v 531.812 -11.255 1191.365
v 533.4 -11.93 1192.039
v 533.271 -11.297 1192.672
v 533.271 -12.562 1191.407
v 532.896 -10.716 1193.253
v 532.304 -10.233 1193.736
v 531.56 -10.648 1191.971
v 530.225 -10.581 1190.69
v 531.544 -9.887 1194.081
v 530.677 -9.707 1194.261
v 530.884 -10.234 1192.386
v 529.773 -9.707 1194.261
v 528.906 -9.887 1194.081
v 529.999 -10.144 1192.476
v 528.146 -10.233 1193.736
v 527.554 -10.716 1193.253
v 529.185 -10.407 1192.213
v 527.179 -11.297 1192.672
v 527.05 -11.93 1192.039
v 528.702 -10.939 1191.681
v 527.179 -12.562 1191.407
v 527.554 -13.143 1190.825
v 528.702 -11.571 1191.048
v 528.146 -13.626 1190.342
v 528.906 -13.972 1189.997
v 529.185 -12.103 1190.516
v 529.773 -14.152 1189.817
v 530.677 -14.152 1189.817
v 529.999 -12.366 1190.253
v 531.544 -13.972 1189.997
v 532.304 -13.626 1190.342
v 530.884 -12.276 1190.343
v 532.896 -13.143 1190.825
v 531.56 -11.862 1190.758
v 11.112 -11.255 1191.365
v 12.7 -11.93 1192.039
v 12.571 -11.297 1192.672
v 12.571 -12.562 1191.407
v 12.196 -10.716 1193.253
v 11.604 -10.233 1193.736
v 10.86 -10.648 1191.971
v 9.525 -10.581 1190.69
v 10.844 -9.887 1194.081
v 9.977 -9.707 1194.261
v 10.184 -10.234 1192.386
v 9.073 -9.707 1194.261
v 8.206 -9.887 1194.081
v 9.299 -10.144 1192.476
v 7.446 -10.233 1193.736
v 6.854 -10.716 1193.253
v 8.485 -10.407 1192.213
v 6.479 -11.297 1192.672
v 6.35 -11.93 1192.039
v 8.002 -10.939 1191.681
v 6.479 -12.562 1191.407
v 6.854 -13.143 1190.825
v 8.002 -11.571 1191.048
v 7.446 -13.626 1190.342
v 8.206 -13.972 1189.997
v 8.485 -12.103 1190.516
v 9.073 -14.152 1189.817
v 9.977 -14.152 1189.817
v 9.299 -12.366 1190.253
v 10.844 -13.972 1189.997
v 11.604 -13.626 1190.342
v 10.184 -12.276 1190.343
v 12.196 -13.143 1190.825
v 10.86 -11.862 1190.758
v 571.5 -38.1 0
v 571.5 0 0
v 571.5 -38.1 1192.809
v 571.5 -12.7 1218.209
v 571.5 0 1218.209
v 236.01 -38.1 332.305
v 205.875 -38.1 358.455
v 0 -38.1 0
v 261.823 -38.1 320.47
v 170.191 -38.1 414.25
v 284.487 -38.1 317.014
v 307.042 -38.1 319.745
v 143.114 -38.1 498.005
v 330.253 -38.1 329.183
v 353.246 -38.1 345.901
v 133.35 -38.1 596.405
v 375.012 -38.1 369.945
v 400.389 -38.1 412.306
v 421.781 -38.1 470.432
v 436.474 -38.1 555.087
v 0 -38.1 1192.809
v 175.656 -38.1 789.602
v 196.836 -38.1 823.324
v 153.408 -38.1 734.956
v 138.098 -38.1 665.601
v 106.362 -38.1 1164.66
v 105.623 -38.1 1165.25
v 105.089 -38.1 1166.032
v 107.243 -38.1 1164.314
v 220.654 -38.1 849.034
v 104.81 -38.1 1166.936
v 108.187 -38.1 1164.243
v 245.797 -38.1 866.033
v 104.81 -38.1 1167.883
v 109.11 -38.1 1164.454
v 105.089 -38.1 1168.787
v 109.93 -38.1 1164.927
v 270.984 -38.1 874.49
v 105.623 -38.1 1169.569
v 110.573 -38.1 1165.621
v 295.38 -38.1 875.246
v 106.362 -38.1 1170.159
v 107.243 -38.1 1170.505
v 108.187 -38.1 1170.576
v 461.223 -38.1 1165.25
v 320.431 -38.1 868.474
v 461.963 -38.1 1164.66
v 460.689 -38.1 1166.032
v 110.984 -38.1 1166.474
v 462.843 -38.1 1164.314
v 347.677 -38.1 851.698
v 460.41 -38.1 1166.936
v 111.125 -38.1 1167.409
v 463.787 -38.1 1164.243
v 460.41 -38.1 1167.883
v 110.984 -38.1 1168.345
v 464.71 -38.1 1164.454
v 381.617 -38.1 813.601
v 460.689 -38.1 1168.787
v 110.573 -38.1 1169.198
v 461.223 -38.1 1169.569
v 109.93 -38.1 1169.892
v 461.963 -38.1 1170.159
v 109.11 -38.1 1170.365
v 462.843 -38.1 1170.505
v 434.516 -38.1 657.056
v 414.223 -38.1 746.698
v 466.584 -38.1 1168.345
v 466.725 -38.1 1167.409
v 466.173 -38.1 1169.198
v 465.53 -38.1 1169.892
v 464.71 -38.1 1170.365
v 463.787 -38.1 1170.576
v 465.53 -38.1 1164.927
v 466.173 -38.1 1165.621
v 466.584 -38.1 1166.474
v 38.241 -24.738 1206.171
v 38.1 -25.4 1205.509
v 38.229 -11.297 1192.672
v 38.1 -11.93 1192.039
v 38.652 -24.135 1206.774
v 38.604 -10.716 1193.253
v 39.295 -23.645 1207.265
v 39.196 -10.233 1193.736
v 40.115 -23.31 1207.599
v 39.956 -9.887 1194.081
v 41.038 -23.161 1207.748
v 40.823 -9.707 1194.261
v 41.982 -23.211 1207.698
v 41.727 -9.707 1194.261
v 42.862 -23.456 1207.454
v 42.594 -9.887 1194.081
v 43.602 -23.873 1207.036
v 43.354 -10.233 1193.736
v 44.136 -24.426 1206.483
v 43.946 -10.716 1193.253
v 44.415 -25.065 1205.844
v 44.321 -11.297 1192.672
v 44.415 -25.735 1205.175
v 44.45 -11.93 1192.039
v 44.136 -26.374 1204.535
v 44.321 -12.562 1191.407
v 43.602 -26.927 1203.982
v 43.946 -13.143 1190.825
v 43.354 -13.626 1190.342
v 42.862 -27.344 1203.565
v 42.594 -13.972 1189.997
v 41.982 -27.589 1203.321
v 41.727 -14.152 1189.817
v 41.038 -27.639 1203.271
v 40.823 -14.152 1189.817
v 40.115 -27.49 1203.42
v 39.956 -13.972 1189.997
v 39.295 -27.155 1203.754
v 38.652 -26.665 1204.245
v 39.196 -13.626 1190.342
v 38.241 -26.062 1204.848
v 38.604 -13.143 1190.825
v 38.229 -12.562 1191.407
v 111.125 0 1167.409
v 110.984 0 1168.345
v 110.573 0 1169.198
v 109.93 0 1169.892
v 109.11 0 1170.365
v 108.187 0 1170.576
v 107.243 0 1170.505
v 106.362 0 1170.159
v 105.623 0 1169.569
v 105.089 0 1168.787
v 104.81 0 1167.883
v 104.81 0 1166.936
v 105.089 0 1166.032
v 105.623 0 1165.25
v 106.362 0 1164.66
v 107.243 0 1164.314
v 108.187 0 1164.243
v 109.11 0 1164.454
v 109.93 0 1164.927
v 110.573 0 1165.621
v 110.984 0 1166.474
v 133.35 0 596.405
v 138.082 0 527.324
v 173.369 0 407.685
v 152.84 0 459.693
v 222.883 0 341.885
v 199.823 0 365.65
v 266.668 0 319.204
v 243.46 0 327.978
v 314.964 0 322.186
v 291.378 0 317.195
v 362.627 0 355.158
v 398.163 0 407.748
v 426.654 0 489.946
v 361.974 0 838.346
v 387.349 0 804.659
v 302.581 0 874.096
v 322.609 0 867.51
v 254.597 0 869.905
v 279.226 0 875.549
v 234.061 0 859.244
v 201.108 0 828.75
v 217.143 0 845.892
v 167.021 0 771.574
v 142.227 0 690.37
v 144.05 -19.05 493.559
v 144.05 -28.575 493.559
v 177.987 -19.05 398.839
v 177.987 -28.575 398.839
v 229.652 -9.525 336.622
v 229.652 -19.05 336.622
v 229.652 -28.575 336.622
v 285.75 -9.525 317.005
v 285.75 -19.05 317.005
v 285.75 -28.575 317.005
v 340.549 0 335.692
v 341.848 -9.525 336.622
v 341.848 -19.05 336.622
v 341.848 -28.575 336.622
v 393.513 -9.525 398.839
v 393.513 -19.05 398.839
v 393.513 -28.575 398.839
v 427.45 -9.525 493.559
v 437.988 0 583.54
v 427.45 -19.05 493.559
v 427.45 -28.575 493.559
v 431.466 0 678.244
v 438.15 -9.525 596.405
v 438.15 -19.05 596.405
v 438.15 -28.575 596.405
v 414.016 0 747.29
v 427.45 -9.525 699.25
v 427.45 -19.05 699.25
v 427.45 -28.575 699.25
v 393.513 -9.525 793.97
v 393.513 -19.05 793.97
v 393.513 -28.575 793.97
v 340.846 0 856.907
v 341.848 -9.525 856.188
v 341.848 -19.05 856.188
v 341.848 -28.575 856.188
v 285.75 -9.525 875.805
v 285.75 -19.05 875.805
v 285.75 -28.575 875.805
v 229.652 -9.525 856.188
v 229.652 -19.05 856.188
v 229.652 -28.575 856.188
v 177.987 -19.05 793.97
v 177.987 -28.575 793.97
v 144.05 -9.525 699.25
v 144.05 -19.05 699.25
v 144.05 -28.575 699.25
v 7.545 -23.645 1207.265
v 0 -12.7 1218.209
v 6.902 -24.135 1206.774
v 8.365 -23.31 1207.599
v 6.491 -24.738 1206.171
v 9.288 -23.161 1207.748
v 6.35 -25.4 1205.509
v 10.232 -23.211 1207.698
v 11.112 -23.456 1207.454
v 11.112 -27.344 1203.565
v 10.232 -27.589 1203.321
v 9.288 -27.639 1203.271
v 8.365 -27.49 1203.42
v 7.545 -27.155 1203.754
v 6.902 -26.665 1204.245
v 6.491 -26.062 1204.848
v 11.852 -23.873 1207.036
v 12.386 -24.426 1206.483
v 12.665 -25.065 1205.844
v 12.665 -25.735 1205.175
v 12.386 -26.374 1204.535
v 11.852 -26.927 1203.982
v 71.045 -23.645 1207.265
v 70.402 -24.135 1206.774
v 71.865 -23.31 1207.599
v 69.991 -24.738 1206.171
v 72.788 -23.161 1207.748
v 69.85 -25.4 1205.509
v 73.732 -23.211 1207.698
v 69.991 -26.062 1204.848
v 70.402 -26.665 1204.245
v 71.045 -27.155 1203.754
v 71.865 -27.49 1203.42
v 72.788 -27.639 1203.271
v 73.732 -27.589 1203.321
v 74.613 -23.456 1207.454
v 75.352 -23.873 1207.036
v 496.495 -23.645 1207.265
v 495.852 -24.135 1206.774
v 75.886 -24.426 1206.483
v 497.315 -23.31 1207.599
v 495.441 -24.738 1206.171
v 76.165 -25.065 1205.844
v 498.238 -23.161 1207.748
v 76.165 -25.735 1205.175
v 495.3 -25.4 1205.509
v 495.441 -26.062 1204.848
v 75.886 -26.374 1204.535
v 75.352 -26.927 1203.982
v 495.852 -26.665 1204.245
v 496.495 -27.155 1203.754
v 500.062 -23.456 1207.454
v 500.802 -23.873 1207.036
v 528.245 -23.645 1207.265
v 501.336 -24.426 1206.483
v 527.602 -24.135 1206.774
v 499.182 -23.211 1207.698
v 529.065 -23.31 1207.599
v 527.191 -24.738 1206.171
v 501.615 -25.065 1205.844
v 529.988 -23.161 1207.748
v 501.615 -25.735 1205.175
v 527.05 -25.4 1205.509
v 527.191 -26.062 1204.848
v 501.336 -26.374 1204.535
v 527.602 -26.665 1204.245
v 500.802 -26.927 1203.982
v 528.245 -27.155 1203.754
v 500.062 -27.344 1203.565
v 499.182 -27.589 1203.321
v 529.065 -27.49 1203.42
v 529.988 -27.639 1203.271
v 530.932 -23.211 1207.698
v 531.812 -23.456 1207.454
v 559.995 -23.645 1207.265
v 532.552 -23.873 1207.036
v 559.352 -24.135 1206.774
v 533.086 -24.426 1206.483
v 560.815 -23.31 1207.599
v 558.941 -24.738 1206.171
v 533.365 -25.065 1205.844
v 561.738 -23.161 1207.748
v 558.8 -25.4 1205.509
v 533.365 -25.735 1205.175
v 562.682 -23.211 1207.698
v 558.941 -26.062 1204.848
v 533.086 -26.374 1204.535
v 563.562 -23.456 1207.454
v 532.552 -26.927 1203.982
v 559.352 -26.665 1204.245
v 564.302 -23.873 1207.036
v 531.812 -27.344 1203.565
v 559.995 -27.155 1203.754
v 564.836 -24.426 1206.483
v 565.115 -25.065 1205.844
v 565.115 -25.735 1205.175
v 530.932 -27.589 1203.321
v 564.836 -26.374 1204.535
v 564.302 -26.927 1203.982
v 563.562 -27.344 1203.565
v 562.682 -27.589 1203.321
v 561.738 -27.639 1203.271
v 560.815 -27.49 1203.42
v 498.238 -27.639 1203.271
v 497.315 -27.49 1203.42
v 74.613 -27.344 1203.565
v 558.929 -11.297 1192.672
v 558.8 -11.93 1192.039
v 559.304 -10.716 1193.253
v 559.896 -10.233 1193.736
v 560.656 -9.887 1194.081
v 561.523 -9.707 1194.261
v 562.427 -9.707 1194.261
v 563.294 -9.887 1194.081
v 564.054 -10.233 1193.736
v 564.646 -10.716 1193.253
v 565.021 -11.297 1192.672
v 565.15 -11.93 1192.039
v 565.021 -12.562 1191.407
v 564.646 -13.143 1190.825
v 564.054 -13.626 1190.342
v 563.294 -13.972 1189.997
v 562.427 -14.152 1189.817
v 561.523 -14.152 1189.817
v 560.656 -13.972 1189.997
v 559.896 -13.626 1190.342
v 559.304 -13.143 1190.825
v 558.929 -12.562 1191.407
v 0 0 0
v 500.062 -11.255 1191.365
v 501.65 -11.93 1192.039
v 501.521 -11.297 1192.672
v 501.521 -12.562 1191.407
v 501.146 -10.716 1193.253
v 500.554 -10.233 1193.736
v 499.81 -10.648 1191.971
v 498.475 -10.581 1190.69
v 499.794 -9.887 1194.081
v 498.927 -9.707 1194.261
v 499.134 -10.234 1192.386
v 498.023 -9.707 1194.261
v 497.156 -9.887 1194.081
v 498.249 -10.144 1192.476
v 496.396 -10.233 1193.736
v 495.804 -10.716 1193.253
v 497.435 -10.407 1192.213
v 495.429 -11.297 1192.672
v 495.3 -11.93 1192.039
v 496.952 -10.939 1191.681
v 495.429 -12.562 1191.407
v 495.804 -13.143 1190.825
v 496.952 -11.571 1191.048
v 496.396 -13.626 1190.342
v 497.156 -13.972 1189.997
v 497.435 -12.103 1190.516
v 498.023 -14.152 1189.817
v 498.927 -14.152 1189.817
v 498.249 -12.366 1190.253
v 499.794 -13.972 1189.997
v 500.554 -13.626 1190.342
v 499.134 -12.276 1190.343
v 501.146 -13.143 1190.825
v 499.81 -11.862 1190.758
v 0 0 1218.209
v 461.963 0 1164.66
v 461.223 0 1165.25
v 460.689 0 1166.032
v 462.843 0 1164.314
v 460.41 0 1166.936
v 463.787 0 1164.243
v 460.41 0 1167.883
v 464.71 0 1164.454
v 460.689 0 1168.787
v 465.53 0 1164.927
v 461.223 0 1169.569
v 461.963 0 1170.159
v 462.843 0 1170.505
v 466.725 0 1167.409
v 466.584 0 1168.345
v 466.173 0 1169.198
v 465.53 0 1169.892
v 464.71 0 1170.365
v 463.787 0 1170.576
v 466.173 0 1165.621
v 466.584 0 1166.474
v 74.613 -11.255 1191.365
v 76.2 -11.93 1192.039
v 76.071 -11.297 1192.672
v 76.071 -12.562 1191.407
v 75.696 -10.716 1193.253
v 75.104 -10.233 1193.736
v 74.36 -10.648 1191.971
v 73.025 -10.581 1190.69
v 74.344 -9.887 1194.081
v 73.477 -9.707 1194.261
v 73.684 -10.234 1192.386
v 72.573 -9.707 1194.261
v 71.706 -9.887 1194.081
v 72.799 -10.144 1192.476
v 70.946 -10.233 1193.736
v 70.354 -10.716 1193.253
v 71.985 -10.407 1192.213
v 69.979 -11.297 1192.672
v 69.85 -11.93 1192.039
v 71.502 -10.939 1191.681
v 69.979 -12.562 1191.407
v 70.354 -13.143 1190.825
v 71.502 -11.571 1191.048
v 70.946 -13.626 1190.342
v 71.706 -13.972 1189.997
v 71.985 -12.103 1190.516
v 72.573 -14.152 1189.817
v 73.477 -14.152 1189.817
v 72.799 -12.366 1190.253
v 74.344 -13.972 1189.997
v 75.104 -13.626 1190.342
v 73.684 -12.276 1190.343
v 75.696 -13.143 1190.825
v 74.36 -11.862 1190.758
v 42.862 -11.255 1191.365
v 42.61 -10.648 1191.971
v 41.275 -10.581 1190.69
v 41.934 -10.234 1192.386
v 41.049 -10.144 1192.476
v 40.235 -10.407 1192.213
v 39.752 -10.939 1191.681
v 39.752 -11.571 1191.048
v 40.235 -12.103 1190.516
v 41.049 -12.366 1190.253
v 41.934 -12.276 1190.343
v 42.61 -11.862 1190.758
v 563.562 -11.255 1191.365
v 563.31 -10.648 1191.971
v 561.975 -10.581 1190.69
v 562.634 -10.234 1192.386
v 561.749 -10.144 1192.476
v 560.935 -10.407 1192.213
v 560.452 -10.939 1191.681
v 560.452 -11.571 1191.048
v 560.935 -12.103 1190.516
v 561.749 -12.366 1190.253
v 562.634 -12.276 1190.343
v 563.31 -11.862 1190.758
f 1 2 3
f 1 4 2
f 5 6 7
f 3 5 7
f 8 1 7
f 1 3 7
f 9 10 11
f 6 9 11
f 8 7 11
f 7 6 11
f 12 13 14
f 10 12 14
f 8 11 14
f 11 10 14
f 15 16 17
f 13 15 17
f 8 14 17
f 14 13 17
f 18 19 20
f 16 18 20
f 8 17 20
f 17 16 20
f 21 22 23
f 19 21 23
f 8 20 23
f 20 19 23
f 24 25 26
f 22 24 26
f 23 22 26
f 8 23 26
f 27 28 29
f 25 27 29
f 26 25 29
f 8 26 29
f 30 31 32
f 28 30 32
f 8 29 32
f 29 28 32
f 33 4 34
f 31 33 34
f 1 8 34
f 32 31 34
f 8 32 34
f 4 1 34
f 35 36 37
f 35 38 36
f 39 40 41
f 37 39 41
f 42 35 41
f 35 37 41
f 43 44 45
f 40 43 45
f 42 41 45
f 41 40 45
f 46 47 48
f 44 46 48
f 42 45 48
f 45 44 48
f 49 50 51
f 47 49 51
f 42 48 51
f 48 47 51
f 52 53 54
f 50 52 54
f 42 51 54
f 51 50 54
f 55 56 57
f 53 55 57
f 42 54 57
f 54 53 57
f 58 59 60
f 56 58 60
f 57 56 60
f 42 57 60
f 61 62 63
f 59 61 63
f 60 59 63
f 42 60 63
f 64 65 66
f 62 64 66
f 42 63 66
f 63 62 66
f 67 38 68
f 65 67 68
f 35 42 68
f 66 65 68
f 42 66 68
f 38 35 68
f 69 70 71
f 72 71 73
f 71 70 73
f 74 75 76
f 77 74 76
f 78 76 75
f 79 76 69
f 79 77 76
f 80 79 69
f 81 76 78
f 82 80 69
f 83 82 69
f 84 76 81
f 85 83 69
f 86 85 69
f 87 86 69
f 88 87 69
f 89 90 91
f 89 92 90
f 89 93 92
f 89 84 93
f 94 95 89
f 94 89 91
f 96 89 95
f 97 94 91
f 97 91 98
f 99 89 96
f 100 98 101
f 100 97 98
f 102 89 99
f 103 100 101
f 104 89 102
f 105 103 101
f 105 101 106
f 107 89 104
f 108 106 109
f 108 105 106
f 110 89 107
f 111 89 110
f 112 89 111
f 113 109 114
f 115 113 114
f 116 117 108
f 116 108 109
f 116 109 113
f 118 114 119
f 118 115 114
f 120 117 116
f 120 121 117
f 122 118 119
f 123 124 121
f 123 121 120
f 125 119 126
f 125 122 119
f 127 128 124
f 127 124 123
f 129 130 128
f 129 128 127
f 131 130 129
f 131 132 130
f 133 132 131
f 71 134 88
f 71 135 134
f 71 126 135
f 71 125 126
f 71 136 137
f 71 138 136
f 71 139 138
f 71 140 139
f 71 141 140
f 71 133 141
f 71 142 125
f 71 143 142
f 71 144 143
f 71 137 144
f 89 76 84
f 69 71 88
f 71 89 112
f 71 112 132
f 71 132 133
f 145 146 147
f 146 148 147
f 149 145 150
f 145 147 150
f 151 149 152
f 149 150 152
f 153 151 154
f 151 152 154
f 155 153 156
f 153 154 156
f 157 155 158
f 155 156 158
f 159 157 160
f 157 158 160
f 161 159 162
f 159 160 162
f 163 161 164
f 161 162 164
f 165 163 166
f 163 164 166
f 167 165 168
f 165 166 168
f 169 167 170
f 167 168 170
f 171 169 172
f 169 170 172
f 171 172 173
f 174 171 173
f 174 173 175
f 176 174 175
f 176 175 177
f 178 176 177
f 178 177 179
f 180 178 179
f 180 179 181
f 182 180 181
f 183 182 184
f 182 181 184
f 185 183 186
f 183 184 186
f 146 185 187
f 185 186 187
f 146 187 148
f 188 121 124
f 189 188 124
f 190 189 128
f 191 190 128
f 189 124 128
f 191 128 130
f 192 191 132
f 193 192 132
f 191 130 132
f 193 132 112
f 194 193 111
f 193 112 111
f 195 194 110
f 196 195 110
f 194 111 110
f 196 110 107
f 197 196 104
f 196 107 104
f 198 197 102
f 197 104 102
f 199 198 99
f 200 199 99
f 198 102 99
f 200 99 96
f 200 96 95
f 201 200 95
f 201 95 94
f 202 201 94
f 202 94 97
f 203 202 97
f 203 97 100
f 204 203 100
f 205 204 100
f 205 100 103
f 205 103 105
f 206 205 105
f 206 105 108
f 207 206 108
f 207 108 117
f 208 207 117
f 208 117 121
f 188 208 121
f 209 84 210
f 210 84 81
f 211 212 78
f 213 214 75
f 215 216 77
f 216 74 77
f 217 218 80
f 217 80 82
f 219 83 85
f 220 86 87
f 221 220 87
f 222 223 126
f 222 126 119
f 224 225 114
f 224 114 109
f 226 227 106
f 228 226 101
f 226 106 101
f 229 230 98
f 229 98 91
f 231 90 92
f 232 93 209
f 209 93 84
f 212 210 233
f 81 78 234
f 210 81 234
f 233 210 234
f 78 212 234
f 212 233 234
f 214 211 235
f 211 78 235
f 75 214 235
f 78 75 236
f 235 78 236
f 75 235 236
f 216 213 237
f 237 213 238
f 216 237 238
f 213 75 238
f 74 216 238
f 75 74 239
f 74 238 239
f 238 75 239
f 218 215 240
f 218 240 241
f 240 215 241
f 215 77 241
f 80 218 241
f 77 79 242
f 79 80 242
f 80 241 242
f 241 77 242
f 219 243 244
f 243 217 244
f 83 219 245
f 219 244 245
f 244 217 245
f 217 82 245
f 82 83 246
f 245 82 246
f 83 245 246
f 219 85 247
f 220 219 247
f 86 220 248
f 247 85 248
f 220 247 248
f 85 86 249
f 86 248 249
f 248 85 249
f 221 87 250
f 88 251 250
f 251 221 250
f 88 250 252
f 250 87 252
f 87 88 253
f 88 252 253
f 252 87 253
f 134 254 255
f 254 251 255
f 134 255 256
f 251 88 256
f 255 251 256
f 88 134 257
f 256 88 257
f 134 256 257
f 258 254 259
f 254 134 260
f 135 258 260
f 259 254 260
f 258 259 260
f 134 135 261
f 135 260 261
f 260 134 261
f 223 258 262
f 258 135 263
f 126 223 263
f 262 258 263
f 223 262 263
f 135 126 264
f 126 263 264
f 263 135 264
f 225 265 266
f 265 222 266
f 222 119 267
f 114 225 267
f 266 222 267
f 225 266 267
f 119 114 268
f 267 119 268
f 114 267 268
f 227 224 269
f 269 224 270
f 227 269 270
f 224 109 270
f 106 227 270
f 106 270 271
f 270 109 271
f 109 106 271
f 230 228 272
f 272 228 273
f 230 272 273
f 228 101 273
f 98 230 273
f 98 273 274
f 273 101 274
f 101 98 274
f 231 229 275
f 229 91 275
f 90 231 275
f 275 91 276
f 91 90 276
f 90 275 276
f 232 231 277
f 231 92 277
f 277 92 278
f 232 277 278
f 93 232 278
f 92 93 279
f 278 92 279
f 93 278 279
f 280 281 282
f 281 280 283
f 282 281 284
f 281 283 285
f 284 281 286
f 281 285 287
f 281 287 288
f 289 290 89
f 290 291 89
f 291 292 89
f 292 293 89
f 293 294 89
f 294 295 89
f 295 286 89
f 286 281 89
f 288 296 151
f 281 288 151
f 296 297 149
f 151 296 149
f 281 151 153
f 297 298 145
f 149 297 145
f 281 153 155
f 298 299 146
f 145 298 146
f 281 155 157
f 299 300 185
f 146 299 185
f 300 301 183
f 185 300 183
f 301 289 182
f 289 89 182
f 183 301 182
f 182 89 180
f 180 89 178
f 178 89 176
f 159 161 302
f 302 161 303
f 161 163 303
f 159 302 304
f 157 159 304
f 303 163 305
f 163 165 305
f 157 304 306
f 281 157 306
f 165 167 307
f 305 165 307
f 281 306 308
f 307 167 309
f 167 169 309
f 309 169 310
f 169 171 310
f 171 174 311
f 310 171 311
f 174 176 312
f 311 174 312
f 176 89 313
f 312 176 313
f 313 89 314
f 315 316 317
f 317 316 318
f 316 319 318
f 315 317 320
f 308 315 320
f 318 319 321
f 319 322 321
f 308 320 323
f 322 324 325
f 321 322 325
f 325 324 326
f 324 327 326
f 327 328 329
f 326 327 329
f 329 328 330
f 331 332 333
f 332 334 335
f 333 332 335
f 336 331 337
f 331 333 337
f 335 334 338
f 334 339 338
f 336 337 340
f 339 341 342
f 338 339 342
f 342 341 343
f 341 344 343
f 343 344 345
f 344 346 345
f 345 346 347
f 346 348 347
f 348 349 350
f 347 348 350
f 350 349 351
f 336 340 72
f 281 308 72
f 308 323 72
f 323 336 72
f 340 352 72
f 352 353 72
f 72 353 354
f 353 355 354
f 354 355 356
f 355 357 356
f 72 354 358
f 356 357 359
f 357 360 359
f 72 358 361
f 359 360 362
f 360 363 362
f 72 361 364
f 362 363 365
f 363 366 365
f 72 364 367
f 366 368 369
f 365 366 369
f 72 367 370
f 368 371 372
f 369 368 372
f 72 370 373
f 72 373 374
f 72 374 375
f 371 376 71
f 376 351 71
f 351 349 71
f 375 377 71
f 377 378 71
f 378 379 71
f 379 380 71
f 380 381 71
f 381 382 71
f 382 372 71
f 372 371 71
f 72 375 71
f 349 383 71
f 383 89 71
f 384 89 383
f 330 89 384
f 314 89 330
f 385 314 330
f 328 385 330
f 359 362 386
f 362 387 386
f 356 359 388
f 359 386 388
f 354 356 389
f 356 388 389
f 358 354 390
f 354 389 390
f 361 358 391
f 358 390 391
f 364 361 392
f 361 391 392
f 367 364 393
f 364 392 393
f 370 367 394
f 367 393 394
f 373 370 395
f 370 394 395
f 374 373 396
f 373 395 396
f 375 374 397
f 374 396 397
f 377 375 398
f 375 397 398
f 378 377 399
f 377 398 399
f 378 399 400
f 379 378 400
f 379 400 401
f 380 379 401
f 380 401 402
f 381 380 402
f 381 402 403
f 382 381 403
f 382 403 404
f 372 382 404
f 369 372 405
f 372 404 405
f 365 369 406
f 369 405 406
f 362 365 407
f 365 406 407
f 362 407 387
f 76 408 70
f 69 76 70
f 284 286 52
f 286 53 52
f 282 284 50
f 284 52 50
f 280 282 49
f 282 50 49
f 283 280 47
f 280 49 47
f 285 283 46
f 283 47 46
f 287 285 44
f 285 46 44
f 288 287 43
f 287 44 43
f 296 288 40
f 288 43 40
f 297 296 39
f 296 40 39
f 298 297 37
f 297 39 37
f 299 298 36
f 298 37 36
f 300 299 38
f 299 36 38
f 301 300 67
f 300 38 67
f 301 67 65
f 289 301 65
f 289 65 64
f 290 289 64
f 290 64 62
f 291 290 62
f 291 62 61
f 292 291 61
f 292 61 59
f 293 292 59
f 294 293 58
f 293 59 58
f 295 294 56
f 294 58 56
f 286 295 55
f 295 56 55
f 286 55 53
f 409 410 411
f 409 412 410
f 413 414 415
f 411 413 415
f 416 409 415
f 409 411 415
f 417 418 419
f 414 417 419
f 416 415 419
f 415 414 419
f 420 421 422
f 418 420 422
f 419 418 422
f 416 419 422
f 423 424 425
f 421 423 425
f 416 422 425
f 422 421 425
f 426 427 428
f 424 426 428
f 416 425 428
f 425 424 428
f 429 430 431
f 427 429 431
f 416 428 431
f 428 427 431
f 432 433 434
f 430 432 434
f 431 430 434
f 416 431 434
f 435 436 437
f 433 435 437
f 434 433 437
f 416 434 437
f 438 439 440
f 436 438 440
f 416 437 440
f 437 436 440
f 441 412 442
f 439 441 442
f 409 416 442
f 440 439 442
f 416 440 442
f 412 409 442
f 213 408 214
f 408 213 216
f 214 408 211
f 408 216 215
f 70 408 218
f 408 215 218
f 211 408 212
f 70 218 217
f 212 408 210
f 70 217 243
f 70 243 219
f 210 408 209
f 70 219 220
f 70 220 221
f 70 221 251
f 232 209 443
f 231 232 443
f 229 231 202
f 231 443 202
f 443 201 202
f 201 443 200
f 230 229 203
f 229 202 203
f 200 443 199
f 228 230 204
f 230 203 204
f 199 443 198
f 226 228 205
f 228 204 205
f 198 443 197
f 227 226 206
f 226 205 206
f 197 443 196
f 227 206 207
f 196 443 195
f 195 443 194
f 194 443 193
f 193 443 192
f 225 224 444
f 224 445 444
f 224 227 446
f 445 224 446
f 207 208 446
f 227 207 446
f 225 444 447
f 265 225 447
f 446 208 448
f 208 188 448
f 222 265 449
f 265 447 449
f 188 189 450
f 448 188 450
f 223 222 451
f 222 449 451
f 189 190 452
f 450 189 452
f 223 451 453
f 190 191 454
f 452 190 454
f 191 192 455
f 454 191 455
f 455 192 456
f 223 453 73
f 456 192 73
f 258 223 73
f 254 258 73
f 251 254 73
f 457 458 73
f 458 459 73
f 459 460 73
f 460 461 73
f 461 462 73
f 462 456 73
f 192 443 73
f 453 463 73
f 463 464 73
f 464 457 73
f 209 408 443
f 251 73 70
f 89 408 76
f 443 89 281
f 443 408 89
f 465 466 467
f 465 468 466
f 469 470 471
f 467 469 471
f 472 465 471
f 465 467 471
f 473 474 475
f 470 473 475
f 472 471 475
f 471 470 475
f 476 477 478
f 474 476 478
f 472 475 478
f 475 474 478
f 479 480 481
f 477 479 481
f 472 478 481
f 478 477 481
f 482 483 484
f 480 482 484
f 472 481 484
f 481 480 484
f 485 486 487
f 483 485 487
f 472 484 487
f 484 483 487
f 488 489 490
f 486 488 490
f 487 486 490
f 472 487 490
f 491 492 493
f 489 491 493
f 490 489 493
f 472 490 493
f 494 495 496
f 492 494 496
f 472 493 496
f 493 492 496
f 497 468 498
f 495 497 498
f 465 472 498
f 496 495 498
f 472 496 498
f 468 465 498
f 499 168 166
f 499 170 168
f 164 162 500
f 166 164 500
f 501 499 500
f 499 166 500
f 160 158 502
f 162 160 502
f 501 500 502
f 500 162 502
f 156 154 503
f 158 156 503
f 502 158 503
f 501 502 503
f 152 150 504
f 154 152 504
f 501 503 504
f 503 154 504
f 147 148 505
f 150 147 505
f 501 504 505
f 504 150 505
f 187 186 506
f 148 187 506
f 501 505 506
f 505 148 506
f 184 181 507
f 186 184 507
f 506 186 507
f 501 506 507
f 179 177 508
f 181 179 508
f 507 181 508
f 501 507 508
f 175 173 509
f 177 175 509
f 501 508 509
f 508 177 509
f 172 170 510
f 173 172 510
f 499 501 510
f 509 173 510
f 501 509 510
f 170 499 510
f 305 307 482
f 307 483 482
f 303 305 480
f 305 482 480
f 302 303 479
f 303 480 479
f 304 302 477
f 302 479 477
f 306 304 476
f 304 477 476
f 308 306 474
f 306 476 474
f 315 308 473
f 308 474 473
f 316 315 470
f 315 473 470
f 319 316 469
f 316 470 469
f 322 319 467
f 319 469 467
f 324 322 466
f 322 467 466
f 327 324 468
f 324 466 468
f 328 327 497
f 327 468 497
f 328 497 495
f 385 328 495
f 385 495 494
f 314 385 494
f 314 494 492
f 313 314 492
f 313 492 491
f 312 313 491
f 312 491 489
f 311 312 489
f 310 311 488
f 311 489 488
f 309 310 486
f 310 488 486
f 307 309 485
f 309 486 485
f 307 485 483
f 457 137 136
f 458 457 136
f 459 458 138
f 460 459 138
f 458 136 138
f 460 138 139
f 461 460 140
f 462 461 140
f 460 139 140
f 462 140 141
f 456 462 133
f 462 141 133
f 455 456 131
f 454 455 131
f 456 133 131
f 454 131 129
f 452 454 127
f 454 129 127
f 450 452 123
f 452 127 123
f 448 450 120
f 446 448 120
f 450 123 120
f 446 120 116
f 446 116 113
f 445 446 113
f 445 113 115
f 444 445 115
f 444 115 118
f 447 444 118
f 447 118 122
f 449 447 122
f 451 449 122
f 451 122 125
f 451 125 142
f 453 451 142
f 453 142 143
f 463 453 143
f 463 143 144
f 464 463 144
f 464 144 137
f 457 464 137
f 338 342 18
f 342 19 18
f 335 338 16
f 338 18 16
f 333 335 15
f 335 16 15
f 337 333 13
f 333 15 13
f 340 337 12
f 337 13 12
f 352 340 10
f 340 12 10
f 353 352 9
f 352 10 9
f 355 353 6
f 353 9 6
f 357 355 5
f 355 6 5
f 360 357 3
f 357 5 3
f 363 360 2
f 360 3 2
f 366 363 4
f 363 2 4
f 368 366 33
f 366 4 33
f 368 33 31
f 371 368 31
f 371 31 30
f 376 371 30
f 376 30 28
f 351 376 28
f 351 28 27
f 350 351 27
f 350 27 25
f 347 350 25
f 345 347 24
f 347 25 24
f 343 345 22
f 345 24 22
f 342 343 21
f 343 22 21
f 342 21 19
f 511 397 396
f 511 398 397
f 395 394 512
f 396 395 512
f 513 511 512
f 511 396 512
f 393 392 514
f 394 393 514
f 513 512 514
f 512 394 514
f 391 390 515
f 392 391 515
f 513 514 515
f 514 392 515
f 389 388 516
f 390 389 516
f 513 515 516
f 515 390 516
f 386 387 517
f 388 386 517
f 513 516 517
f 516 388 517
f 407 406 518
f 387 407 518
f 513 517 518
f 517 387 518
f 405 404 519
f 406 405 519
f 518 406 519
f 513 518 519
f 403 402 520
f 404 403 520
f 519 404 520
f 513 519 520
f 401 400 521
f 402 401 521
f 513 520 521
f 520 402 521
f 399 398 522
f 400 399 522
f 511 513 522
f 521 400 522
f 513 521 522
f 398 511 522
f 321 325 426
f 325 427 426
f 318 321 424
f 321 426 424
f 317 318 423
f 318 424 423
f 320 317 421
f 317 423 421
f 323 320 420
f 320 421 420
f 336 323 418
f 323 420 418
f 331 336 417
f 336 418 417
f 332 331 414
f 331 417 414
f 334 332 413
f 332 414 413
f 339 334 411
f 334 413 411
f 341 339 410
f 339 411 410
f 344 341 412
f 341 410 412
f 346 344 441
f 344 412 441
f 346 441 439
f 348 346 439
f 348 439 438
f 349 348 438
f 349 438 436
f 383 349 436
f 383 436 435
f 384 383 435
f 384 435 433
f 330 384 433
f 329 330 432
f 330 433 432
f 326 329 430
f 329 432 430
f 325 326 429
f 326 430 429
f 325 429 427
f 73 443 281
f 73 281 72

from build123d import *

# Parameters (mm, degrees)
F0_W     = 571.5
F0_H     = 1218.2094
F1_DEPTH = 38.1
F2_SIZE  = 25.4
F4_D     = 6.35
F4_DEPTH = 19.05
F4_TIP   = 1.9077324654
F6_DEPTH = 38.101
F8_D     = 6.35


with BuildPart() as f1:
    # F0 (on Front) → F1 (new body)
    with BuildSketch(Plane.XZ):
        with Locations((285.75, 609.1047)):
            Rectangle(F0_W, F0_H)
    extrude(amount=F1_DEPTH)

    # F2
    f2_edges = [f1.edges().sort_by_distance(p)[0] for p in [
        (285.75, -38.1, 1218.2094),
    ]]
    chamfer(f2_edges, length=F2_SIZE)

    # F4
    with Locations(Plane(origin=(0, -615.4547, 615.4547), x_dir=(1, 0, 0), z_dir=(0, -0.7071067812, 0.7071067812))):
        with Locations((9.525, 834.463359282), (41.275, 834.463359282), (73.025, 834.463359282), (498.475, 834.463359282), (530.225, 834.463359282), (561.975, 834.463359282)):
            Hole(F4_D / 2, depth=F4_DEPTH)
            with Locations((0, 0, -(F4_DEPTH + F4_TIP / 2))):  # 118° drill point
                Cone(0, F4_D / 2, F4_TIP, mode=Mode.SUBTRACT)

    # F5 (on face) → F6 (cut, through all)
    with BuildSketch(Plane.XZ.offset(38.1)):
        with BuildLine():
            add(Edge.make_bspline(
                [(285.75, 875.8047), (133.35, 875.8047), (133.35, 596.4047)],
                knots=[0, 0, 0, 1.5707963268, 1.5707963268, 1.5707963268], degree=2, weights=[1, 0.7071067812, 1]))
            Line((133.35, 596.4047), (285.75, 596.4047))
            Line((285.75, 596.4047), (285.75, 875.8047))
        make_face()
        with BuildLine():
            Line((285.75, 875.8047), (285.75, 596.4047))
            Line((285.75, 596.4047), (438.15, 596.4047))
            add(Edge.make_bspline(
                [(438.15, 596.4047), (438.15, 875.8047), (285.75, 875.8047)],
                knots=[4.7123889804, 4.7123889804, 4.7123889804, 6.2831853072, 6.2831853072, 6.2831853072], degree=2, weights=[1, 0.7071067812, 1]))
        make_face()
        with BuildLine():
            Line((438.15, 596.4047), (285.75, 596.4047))
            Line((285.75, 596.4047), (285.75, 317.0047))
            add(Edge.make_bspline(
                [(285.75, 317.0047), (438.15, 317.0047), (438.15, 596.4047)],
                knots=[3.1415926536, 3.1415926536, 3.1415926536, 4.7123889804, 4.7123889804, 4.7123889804], degree=2, weights=[1, 0.7071067812, 1]))
        make_face()
        with BuildLine():
            Line((285.75, 596.4047), (133.35, 596.4047))
            add(Edge.make_bspline(
                [(133.35, 596.4047), (133.35, 317.0047), (285.75, 317.0047)],
                knots=[1.5707963268, 1.5707963268, 1.5707963268, 3.1415926536, 3.1415926536, 3.1415926536], degree=2, weights=[1, 0.7071067812, 1]))
            Line((285.75, 317.0047), (285.75, 596.4047))
        make_face()
    extrude(amount=-F6_DEPTH, mode=Mode.SUBTRACT)

    # F8 (through all)
    with Locations(Plane(origin=(0, 0, 0), x_dir=(-1, 0, 0), z_dir=(0, 1, 0))):
        with Locations((-463.55, 1167.4094), (-107.95, 1167.4094)):
            Hole(F8_D / 2)


solid = f1.part
